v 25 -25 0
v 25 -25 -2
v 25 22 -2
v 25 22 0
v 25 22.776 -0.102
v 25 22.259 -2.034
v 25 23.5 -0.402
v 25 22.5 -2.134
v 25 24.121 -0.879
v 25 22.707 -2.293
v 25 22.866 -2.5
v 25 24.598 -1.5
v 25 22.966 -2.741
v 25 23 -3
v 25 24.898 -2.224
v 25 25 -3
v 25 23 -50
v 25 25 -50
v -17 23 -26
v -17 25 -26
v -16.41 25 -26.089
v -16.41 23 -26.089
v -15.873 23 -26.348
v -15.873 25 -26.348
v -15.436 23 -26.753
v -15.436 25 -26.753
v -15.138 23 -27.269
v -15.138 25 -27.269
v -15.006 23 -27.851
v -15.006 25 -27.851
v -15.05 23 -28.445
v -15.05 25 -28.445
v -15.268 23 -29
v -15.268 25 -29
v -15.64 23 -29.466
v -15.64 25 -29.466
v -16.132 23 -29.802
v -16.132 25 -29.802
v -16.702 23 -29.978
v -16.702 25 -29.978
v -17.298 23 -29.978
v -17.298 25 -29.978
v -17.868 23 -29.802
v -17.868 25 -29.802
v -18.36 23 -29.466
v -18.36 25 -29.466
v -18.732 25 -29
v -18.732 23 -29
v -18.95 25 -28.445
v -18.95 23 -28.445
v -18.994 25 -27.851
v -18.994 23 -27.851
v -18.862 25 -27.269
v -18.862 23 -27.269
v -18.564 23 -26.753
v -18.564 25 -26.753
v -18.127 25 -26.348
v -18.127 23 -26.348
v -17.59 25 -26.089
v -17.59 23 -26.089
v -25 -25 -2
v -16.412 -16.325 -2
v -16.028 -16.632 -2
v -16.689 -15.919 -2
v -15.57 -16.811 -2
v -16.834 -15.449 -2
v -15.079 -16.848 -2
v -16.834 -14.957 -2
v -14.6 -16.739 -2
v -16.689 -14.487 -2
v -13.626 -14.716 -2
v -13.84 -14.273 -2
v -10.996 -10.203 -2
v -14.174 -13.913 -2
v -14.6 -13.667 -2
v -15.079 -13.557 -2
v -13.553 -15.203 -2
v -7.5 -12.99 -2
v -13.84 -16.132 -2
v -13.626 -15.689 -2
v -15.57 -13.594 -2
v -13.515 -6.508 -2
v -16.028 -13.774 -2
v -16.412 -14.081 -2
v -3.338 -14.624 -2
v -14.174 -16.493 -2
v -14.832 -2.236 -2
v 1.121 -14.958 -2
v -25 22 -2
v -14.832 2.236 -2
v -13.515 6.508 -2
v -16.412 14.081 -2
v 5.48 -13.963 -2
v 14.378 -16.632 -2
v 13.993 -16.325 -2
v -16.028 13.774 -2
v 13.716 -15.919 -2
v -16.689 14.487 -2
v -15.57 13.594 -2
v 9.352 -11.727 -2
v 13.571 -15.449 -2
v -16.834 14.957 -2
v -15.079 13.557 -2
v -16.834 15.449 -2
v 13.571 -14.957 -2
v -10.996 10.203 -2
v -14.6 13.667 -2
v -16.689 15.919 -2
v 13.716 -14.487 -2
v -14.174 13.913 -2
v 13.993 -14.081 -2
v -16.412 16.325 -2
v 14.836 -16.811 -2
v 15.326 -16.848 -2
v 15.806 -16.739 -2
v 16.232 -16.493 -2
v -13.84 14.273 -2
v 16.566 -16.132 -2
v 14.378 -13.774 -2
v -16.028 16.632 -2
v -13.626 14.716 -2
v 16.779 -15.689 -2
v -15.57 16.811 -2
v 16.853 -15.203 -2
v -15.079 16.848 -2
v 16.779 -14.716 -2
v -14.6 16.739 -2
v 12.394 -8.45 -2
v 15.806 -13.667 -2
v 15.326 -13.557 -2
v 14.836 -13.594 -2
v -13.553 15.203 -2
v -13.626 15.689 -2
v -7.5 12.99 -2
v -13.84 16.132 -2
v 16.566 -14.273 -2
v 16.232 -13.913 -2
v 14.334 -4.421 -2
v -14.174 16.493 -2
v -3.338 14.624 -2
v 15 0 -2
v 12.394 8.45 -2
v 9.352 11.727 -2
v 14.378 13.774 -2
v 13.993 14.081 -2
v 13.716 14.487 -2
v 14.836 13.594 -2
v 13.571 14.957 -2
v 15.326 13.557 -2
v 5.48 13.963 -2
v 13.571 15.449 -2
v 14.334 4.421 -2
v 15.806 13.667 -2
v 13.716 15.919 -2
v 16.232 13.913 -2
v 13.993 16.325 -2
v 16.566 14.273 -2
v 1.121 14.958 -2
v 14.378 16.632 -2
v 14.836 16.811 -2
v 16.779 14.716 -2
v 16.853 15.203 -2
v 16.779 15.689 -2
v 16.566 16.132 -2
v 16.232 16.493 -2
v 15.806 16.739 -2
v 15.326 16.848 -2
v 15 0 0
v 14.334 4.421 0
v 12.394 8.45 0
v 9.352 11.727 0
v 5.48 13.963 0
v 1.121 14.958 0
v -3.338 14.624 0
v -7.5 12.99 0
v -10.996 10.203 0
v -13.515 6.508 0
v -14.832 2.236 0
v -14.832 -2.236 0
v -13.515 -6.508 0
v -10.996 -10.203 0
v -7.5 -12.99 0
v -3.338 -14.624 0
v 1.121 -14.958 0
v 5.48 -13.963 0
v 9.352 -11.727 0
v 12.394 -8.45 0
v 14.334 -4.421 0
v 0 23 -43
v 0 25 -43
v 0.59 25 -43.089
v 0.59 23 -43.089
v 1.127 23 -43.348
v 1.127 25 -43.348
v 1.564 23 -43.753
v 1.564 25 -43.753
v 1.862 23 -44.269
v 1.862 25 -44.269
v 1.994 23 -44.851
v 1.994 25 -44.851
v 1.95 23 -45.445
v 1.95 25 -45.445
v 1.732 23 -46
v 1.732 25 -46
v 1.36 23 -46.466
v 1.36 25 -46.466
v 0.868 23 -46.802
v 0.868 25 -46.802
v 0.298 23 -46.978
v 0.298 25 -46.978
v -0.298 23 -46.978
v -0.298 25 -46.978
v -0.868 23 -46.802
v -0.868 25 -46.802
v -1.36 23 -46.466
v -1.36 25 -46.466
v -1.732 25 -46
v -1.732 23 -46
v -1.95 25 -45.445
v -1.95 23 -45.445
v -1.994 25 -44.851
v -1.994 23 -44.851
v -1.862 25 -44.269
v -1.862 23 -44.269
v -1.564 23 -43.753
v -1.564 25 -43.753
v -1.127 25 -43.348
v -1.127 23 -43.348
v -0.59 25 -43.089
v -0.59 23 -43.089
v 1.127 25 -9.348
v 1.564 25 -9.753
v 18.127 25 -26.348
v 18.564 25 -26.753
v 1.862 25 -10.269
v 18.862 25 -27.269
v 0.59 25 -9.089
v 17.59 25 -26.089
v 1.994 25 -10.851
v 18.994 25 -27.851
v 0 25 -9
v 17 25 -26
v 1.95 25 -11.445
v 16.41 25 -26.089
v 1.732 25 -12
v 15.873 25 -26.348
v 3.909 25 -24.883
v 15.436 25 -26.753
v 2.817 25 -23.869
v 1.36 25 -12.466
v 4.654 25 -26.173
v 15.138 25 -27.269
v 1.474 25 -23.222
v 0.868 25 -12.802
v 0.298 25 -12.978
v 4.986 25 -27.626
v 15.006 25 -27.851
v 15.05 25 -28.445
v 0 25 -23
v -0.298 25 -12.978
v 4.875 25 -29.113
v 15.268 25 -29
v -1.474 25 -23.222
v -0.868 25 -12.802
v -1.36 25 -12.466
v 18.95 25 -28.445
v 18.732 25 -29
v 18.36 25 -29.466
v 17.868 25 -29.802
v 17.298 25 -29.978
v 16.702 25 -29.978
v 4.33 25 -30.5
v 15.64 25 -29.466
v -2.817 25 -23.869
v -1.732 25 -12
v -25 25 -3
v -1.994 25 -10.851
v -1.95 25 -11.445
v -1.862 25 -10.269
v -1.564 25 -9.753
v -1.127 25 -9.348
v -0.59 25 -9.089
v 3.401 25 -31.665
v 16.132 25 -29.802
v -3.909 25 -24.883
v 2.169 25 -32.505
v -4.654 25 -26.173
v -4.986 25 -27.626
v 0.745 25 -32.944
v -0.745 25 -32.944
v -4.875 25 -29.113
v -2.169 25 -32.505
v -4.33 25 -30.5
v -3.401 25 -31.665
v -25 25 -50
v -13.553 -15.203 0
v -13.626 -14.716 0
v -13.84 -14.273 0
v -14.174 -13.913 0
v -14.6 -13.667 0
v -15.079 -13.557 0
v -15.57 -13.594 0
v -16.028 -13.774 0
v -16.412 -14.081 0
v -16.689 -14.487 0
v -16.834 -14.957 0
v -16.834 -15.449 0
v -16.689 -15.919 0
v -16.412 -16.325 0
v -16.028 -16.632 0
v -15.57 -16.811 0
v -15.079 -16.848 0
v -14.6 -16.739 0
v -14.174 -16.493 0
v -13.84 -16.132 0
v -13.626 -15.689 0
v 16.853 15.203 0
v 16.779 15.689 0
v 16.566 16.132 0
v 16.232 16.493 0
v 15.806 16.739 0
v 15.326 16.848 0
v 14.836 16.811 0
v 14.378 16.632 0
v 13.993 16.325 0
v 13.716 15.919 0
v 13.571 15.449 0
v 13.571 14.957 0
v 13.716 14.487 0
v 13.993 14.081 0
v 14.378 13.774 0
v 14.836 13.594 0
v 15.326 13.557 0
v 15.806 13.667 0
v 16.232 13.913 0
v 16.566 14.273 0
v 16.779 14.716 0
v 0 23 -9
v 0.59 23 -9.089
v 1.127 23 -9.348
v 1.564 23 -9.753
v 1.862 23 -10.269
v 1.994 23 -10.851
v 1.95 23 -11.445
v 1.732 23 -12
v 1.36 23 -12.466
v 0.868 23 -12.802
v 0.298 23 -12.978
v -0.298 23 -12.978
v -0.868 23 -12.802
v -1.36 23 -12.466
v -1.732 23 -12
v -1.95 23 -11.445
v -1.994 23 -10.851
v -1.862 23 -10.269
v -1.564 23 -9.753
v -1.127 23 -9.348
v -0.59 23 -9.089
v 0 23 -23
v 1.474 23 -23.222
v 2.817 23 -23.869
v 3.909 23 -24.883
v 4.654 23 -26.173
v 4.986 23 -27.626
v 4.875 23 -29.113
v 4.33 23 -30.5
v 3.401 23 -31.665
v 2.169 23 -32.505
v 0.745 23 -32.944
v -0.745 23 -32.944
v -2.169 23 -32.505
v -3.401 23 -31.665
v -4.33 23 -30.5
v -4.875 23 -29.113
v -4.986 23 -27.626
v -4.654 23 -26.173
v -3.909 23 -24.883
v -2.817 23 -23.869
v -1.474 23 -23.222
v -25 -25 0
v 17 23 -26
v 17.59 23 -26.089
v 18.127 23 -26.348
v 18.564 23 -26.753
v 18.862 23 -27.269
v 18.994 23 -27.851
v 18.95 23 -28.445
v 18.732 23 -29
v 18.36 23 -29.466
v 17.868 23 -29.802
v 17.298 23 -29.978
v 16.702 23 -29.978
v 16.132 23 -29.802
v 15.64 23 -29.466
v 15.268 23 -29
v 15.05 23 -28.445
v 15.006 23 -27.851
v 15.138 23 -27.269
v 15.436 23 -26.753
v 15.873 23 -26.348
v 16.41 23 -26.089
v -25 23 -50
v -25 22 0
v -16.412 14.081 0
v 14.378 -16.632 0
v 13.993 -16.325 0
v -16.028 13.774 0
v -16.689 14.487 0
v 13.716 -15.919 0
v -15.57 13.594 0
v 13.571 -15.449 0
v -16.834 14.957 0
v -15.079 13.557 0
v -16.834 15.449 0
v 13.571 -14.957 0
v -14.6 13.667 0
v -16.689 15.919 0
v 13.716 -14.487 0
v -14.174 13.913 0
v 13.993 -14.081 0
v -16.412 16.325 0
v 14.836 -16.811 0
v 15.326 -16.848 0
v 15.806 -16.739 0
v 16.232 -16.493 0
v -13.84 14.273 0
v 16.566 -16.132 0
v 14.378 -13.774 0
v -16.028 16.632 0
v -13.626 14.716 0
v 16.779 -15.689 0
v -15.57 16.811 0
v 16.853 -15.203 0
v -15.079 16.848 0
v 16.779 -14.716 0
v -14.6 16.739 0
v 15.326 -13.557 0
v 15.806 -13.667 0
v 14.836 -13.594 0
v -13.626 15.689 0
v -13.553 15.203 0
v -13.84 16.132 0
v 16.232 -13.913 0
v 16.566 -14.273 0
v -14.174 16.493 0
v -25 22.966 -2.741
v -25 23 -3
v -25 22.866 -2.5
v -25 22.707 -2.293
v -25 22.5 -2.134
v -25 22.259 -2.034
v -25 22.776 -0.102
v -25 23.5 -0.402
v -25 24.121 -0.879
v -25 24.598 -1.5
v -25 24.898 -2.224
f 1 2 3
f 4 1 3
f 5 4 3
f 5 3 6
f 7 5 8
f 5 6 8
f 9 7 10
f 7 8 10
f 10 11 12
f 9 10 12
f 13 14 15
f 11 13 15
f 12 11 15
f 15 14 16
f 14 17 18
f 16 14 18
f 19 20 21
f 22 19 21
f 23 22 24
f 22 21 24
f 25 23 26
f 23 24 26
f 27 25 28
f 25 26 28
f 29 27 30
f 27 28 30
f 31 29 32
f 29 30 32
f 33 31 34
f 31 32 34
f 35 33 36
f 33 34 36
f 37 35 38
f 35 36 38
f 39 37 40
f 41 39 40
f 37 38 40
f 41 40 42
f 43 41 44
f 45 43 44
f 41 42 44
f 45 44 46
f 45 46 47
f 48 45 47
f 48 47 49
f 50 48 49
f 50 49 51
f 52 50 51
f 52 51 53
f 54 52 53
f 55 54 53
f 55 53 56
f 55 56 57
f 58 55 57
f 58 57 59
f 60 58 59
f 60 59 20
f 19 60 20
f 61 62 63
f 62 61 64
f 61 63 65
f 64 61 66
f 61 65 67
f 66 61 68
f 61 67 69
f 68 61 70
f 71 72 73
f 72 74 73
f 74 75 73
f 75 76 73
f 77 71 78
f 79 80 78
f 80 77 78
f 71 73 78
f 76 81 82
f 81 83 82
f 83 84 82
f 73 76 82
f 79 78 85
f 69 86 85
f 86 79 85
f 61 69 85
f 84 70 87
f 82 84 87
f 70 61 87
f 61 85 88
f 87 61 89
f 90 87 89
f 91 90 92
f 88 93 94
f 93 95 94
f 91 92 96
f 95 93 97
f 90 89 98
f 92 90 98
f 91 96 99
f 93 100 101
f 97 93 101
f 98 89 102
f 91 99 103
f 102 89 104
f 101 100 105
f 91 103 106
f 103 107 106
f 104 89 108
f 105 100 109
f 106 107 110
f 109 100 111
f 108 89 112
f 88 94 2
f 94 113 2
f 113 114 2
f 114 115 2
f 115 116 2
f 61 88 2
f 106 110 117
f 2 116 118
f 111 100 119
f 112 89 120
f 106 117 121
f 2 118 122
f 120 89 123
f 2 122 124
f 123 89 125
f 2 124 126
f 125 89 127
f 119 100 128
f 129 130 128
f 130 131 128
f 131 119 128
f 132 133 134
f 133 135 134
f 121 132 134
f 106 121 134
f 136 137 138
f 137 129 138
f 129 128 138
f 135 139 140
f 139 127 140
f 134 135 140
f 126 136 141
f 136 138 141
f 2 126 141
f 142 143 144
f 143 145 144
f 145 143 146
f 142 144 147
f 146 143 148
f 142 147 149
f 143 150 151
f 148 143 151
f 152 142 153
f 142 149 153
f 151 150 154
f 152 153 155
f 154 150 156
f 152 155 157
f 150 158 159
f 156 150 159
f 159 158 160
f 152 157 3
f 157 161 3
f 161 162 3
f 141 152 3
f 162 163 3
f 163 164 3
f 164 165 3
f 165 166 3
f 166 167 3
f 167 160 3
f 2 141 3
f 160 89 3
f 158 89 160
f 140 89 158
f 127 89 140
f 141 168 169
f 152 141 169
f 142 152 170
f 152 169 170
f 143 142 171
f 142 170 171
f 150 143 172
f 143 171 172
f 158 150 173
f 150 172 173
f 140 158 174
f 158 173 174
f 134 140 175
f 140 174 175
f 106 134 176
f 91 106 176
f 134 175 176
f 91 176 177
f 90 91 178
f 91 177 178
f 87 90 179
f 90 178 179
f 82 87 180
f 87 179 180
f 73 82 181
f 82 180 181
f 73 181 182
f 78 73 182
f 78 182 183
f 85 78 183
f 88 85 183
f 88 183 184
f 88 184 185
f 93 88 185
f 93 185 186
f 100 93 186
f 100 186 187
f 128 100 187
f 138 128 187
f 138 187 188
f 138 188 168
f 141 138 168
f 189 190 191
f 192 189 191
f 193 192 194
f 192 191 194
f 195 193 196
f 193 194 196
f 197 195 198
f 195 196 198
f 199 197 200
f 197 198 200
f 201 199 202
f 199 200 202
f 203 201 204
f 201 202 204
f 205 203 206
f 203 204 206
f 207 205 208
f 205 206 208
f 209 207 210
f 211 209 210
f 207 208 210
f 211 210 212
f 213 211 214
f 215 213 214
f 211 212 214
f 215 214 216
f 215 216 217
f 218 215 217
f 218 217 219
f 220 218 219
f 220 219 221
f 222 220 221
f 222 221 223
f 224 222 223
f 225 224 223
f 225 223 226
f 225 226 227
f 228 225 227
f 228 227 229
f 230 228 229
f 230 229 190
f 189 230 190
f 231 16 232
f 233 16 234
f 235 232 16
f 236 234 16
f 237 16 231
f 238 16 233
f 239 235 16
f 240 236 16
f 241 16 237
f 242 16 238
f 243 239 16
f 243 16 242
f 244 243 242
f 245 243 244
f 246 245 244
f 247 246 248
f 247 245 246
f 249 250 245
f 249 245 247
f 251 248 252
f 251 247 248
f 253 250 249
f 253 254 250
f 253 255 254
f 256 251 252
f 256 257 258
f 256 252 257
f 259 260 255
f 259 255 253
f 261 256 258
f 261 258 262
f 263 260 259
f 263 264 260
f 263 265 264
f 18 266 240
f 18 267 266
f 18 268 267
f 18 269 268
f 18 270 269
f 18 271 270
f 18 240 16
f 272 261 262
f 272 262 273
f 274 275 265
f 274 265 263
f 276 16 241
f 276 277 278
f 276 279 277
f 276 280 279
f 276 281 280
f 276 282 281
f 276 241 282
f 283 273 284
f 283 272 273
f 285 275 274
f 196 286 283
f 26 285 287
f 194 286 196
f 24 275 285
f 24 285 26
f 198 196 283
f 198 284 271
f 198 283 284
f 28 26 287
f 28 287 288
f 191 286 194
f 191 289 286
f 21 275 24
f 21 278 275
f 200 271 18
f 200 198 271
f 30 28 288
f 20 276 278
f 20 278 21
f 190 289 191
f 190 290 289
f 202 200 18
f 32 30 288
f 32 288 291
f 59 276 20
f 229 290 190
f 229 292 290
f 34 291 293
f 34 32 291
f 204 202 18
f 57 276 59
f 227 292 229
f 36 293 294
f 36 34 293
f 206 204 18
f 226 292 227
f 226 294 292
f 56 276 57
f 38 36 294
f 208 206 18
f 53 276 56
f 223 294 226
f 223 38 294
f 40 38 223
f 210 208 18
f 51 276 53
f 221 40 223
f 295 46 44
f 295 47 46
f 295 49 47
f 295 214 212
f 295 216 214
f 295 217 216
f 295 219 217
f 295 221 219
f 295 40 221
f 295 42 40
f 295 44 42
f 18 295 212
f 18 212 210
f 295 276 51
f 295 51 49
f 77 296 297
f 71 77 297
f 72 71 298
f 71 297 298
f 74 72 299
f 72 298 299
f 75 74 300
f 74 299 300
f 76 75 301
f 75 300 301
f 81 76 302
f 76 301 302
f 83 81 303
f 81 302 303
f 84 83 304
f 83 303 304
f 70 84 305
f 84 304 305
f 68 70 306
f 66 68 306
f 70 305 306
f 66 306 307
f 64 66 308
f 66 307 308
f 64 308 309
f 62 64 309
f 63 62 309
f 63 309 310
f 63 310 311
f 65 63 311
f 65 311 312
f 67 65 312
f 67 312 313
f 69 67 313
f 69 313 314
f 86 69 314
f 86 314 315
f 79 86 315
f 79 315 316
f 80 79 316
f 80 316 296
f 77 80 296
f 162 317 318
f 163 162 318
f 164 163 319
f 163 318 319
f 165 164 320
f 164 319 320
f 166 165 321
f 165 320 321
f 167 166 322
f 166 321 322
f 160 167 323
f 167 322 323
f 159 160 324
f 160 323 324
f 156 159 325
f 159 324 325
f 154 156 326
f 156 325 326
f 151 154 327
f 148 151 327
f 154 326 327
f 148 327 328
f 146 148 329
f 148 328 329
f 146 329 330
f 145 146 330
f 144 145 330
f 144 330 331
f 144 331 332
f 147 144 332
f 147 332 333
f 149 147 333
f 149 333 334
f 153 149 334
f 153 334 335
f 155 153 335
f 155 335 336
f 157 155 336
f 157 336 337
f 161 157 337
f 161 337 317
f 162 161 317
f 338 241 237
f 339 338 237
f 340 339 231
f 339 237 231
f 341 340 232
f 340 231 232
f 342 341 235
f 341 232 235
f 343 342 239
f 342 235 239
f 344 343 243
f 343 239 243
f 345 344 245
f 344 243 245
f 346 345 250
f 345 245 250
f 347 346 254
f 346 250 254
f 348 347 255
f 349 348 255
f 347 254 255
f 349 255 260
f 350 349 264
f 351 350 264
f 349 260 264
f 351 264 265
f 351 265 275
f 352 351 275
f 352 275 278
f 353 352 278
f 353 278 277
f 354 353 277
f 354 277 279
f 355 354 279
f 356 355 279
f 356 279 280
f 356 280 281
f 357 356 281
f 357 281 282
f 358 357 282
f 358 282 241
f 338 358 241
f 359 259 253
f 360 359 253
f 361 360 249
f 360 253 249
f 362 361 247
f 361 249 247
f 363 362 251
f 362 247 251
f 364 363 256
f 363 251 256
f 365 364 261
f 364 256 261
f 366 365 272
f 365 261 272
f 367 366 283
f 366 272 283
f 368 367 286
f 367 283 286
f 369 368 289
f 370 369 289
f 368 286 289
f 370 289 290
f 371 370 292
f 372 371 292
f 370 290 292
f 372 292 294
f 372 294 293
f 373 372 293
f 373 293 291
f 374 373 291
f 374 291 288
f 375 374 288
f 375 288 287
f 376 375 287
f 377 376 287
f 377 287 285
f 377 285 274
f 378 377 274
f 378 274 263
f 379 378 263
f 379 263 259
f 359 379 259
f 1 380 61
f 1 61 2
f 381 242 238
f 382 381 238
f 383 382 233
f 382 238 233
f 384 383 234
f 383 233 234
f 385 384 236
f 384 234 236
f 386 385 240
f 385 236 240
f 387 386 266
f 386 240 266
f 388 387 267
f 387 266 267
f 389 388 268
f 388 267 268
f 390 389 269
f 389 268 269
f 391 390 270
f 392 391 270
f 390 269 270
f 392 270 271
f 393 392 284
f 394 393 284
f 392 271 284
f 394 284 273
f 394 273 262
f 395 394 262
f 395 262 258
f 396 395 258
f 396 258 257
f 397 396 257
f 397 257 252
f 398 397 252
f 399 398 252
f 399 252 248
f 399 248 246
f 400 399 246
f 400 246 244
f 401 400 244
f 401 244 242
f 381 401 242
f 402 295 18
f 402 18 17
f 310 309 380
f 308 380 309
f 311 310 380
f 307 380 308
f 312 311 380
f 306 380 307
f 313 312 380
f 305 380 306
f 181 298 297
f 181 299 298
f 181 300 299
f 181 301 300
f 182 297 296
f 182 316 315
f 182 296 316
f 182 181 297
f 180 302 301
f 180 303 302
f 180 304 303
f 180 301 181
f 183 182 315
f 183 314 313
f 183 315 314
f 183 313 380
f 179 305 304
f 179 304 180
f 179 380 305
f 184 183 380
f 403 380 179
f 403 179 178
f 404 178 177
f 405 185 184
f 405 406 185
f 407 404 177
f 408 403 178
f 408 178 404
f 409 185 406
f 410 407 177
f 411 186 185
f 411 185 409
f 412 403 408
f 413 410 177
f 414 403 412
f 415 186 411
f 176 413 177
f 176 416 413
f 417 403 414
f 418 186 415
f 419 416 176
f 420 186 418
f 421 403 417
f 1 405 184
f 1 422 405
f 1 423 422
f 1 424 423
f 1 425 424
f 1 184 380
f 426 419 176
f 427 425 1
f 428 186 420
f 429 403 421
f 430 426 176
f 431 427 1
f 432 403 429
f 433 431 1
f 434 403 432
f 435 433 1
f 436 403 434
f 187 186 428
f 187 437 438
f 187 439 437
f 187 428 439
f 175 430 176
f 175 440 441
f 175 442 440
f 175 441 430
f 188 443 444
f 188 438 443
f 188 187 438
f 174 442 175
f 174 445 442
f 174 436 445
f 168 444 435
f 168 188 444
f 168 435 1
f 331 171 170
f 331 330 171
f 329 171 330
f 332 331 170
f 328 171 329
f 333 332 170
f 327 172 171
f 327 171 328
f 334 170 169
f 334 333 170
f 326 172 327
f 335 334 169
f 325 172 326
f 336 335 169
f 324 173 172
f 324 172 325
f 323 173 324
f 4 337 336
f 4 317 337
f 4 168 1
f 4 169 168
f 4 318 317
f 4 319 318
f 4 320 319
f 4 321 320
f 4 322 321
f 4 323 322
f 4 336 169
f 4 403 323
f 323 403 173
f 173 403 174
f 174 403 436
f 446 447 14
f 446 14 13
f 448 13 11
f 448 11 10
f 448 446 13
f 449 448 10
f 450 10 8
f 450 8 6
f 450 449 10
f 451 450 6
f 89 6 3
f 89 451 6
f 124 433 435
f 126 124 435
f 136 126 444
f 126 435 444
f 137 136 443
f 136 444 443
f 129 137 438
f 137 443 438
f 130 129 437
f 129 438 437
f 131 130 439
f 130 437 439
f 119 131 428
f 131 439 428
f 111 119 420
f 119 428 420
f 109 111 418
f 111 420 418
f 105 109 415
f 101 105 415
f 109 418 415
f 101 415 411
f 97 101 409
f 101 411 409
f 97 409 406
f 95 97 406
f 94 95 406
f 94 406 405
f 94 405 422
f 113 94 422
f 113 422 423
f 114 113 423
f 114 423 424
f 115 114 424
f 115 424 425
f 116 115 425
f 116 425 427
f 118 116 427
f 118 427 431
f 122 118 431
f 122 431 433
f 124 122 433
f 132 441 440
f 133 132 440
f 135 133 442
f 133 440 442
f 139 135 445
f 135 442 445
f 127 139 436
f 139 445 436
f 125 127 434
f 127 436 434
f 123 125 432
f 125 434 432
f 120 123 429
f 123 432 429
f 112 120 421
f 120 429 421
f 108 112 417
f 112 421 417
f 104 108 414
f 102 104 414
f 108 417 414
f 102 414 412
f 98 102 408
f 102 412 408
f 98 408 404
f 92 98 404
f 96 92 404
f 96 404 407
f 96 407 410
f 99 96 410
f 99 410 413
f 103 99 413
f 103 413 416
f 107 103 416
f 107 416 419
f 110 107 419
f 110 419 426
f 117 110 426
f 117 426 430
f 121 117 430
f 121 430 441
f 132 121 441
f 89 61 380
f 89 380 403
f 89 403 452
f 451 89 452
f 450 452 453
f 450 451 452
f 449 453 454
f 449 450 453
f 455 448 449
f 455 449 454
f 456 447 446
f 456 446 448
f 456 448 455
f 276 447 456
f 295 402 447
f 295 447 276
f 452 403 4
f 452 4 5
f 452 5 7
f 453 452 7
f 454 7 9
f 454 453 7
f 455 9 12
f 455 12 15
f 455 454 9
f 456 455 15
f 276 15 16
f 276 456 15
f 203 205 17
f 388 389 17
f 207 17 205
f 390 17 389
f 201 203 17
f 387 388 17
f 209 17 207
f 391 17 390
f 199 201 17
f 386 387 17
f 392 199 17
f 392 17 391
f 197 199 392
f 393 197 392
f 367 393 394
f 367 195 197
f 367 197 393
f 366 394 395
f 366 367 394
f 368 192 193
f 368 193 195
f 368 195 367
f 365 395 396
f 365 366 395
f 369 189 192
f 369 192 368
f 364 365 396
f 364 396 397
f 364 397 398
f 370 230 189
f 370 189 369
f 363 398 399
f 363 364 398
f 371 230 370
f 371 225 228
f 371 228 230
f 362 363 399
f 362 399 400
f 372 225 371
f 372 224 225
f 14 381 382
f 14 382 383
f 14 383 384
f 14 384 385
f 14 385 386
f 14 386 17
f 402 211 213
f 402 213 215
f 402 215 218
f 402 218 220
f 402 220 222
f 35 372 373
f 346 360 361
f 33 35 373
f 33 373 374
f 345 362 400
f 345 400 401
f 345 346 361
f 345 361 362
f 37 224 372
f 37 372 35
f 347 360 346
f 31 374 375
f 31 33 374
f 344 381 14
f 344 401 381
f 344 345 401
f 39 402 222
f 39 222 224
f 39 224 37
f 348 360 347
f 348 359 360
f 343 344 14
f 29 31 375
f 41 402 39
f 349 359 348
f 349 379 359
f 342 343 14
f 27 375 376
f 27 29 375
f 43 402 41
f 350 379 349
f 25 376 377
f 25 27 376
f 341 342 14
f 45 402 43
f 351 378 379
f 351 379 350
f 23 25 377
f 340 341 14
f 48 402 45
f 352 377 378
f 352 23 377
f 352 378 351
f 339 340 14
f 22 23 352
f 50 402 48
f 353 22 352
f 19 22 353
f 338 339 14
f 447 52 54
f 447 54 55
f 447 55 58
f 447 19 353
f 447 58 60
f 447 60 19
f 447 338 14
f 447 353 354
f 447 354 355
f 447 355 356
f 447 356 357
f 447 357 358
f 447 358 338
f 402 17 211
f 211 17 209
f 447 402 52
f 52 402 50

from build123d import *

# Parameters (mm, degrees)
SKETCH_1_W                       = 50
SKETCH_1_H                       = 50
SM_BASE_FLANGE_1_DEPTH           = 2
SM_EDGE_FLANGE_1_STRIP_W         = 10
SM_EDGE_FLANGE_1_STRIP_H         = 2
SM_EDGE_FLANGE_1_STRIP_CUT_DEPTH = 50
SM_EDGE_FLANGE_1_DEPTH           = 50
SKETCH_9_R                       = 15
SKETCH_9_R_2                     = 1.65
CUT_EXTRUDE_2_DEPTH              = 10
SKETCH_12_R                      = 5
SKETCH_12_R_2                    = 2
CUT_EXTRUDE_4_DEPTH              = 10


# Sheet-metal steps are written as plain solids
with BuildPart() as part:
    # Sketch 1 → 基体-法兰1 (new body)
    with BuildSketch(Plane.XY):
        Rectangle(SKETCH_1_W, SKETCH_1_H)
    extrude(amount=-SM_BASE_FLANGE_1_DEPTH)

    # 边线-法兰1 strip (across the edge) → 边线-法兰1 strip cut (cut)
    with BuildSketch(Plane(origin=(-25, 25, -2), x_dir=(0, -1, 0), z_dir=(1, 0, 0))):
        with Locations((-2, -1)):
            Rectangle(SM_EDGE_FLANGE_1_STRIP_W, SM_EDGE_FLANGE_1_STRIP_H)
    extrude(amount=SM_EDGE_FLANGE_1_STRIP_CUT_DEPTH, mode=Mode.SUBTRACT)

    # 边线-法兰1 section (across the edge) → 边线-法兰1 (add)
    with BuildSketch(Plane(origin=(-25, 25, -2), x_dir=(0, -1, 0), z_dir=(1, 0, 0))):
        with BuildLine():
            Line((0, 1), (0, 48))
            Line((0, 48), (2, 48))
            Line((2, 48), (2, 1))
            ThreePointArc((2, 1), (2.292893219, 0.292893219), (3, 0))
            Line((3, 0), (3, -2))
            ThreePointArc((3, -2), (0.878679656, -1.121320344), (0, 1))
        make_face()
    extrude(amount=SM_EDGE_FLANGE_1_DEPTH)

    # 草图9 → 切除-拉伸2 (cut)
    with BuildSketch(Plane.XY):
        Circle(SKETCH_9_R)
        with Locations((-15.202795796, 15.202795796)):
            Circle(SKETCH_9_R_2)
        with Locations((15.202795796, 15.202795796)):
            Circle(SKETCH_9_R_2)
        with Locations((15.202795796, -15.202795796)):
            Circle(SKETCH_9_R_2)
        with Locations((-15.202795796, -15.202795796)):
            Circle(SKETCH_9_R_2)
    extrude(amount=-CUT_EXTRUDE_2_DEPTH, mode=Mode.SUBTRACT)

    # 草图12 → 切除-拉伸4 (cut)
    with BuildSketch(Plane(origin=(0, 25, 0), x_dir=(1, 0, 0), z_dir=(0, 1, 0))):
        with Locations(Location((0, 28, 0), (0, 0, 270))):
            Circle(SKETCH_12_R)
        with Locations(Location((0, 45, 0), (0, 0, 270))):
            Circle(SKETCH_12_R_2)
        with Locations(Location((17, 28, 0), (0, 0, 270))):
            Circle(SKETCH_12_R_2)
        with Locations(Location((0, 11, 0), (0, 0, 270))):
            Circle(SKETCH_12_R_2)
        with Locations(Location((-17, 28, 0), (0, 0, 270))):
            Circle(SKETCH_12_R_2)
    extrude(amount=-CUT_EXTRUDE_4_DEPTH, mode=Mode.SUBTRACT)


solid = part.part
